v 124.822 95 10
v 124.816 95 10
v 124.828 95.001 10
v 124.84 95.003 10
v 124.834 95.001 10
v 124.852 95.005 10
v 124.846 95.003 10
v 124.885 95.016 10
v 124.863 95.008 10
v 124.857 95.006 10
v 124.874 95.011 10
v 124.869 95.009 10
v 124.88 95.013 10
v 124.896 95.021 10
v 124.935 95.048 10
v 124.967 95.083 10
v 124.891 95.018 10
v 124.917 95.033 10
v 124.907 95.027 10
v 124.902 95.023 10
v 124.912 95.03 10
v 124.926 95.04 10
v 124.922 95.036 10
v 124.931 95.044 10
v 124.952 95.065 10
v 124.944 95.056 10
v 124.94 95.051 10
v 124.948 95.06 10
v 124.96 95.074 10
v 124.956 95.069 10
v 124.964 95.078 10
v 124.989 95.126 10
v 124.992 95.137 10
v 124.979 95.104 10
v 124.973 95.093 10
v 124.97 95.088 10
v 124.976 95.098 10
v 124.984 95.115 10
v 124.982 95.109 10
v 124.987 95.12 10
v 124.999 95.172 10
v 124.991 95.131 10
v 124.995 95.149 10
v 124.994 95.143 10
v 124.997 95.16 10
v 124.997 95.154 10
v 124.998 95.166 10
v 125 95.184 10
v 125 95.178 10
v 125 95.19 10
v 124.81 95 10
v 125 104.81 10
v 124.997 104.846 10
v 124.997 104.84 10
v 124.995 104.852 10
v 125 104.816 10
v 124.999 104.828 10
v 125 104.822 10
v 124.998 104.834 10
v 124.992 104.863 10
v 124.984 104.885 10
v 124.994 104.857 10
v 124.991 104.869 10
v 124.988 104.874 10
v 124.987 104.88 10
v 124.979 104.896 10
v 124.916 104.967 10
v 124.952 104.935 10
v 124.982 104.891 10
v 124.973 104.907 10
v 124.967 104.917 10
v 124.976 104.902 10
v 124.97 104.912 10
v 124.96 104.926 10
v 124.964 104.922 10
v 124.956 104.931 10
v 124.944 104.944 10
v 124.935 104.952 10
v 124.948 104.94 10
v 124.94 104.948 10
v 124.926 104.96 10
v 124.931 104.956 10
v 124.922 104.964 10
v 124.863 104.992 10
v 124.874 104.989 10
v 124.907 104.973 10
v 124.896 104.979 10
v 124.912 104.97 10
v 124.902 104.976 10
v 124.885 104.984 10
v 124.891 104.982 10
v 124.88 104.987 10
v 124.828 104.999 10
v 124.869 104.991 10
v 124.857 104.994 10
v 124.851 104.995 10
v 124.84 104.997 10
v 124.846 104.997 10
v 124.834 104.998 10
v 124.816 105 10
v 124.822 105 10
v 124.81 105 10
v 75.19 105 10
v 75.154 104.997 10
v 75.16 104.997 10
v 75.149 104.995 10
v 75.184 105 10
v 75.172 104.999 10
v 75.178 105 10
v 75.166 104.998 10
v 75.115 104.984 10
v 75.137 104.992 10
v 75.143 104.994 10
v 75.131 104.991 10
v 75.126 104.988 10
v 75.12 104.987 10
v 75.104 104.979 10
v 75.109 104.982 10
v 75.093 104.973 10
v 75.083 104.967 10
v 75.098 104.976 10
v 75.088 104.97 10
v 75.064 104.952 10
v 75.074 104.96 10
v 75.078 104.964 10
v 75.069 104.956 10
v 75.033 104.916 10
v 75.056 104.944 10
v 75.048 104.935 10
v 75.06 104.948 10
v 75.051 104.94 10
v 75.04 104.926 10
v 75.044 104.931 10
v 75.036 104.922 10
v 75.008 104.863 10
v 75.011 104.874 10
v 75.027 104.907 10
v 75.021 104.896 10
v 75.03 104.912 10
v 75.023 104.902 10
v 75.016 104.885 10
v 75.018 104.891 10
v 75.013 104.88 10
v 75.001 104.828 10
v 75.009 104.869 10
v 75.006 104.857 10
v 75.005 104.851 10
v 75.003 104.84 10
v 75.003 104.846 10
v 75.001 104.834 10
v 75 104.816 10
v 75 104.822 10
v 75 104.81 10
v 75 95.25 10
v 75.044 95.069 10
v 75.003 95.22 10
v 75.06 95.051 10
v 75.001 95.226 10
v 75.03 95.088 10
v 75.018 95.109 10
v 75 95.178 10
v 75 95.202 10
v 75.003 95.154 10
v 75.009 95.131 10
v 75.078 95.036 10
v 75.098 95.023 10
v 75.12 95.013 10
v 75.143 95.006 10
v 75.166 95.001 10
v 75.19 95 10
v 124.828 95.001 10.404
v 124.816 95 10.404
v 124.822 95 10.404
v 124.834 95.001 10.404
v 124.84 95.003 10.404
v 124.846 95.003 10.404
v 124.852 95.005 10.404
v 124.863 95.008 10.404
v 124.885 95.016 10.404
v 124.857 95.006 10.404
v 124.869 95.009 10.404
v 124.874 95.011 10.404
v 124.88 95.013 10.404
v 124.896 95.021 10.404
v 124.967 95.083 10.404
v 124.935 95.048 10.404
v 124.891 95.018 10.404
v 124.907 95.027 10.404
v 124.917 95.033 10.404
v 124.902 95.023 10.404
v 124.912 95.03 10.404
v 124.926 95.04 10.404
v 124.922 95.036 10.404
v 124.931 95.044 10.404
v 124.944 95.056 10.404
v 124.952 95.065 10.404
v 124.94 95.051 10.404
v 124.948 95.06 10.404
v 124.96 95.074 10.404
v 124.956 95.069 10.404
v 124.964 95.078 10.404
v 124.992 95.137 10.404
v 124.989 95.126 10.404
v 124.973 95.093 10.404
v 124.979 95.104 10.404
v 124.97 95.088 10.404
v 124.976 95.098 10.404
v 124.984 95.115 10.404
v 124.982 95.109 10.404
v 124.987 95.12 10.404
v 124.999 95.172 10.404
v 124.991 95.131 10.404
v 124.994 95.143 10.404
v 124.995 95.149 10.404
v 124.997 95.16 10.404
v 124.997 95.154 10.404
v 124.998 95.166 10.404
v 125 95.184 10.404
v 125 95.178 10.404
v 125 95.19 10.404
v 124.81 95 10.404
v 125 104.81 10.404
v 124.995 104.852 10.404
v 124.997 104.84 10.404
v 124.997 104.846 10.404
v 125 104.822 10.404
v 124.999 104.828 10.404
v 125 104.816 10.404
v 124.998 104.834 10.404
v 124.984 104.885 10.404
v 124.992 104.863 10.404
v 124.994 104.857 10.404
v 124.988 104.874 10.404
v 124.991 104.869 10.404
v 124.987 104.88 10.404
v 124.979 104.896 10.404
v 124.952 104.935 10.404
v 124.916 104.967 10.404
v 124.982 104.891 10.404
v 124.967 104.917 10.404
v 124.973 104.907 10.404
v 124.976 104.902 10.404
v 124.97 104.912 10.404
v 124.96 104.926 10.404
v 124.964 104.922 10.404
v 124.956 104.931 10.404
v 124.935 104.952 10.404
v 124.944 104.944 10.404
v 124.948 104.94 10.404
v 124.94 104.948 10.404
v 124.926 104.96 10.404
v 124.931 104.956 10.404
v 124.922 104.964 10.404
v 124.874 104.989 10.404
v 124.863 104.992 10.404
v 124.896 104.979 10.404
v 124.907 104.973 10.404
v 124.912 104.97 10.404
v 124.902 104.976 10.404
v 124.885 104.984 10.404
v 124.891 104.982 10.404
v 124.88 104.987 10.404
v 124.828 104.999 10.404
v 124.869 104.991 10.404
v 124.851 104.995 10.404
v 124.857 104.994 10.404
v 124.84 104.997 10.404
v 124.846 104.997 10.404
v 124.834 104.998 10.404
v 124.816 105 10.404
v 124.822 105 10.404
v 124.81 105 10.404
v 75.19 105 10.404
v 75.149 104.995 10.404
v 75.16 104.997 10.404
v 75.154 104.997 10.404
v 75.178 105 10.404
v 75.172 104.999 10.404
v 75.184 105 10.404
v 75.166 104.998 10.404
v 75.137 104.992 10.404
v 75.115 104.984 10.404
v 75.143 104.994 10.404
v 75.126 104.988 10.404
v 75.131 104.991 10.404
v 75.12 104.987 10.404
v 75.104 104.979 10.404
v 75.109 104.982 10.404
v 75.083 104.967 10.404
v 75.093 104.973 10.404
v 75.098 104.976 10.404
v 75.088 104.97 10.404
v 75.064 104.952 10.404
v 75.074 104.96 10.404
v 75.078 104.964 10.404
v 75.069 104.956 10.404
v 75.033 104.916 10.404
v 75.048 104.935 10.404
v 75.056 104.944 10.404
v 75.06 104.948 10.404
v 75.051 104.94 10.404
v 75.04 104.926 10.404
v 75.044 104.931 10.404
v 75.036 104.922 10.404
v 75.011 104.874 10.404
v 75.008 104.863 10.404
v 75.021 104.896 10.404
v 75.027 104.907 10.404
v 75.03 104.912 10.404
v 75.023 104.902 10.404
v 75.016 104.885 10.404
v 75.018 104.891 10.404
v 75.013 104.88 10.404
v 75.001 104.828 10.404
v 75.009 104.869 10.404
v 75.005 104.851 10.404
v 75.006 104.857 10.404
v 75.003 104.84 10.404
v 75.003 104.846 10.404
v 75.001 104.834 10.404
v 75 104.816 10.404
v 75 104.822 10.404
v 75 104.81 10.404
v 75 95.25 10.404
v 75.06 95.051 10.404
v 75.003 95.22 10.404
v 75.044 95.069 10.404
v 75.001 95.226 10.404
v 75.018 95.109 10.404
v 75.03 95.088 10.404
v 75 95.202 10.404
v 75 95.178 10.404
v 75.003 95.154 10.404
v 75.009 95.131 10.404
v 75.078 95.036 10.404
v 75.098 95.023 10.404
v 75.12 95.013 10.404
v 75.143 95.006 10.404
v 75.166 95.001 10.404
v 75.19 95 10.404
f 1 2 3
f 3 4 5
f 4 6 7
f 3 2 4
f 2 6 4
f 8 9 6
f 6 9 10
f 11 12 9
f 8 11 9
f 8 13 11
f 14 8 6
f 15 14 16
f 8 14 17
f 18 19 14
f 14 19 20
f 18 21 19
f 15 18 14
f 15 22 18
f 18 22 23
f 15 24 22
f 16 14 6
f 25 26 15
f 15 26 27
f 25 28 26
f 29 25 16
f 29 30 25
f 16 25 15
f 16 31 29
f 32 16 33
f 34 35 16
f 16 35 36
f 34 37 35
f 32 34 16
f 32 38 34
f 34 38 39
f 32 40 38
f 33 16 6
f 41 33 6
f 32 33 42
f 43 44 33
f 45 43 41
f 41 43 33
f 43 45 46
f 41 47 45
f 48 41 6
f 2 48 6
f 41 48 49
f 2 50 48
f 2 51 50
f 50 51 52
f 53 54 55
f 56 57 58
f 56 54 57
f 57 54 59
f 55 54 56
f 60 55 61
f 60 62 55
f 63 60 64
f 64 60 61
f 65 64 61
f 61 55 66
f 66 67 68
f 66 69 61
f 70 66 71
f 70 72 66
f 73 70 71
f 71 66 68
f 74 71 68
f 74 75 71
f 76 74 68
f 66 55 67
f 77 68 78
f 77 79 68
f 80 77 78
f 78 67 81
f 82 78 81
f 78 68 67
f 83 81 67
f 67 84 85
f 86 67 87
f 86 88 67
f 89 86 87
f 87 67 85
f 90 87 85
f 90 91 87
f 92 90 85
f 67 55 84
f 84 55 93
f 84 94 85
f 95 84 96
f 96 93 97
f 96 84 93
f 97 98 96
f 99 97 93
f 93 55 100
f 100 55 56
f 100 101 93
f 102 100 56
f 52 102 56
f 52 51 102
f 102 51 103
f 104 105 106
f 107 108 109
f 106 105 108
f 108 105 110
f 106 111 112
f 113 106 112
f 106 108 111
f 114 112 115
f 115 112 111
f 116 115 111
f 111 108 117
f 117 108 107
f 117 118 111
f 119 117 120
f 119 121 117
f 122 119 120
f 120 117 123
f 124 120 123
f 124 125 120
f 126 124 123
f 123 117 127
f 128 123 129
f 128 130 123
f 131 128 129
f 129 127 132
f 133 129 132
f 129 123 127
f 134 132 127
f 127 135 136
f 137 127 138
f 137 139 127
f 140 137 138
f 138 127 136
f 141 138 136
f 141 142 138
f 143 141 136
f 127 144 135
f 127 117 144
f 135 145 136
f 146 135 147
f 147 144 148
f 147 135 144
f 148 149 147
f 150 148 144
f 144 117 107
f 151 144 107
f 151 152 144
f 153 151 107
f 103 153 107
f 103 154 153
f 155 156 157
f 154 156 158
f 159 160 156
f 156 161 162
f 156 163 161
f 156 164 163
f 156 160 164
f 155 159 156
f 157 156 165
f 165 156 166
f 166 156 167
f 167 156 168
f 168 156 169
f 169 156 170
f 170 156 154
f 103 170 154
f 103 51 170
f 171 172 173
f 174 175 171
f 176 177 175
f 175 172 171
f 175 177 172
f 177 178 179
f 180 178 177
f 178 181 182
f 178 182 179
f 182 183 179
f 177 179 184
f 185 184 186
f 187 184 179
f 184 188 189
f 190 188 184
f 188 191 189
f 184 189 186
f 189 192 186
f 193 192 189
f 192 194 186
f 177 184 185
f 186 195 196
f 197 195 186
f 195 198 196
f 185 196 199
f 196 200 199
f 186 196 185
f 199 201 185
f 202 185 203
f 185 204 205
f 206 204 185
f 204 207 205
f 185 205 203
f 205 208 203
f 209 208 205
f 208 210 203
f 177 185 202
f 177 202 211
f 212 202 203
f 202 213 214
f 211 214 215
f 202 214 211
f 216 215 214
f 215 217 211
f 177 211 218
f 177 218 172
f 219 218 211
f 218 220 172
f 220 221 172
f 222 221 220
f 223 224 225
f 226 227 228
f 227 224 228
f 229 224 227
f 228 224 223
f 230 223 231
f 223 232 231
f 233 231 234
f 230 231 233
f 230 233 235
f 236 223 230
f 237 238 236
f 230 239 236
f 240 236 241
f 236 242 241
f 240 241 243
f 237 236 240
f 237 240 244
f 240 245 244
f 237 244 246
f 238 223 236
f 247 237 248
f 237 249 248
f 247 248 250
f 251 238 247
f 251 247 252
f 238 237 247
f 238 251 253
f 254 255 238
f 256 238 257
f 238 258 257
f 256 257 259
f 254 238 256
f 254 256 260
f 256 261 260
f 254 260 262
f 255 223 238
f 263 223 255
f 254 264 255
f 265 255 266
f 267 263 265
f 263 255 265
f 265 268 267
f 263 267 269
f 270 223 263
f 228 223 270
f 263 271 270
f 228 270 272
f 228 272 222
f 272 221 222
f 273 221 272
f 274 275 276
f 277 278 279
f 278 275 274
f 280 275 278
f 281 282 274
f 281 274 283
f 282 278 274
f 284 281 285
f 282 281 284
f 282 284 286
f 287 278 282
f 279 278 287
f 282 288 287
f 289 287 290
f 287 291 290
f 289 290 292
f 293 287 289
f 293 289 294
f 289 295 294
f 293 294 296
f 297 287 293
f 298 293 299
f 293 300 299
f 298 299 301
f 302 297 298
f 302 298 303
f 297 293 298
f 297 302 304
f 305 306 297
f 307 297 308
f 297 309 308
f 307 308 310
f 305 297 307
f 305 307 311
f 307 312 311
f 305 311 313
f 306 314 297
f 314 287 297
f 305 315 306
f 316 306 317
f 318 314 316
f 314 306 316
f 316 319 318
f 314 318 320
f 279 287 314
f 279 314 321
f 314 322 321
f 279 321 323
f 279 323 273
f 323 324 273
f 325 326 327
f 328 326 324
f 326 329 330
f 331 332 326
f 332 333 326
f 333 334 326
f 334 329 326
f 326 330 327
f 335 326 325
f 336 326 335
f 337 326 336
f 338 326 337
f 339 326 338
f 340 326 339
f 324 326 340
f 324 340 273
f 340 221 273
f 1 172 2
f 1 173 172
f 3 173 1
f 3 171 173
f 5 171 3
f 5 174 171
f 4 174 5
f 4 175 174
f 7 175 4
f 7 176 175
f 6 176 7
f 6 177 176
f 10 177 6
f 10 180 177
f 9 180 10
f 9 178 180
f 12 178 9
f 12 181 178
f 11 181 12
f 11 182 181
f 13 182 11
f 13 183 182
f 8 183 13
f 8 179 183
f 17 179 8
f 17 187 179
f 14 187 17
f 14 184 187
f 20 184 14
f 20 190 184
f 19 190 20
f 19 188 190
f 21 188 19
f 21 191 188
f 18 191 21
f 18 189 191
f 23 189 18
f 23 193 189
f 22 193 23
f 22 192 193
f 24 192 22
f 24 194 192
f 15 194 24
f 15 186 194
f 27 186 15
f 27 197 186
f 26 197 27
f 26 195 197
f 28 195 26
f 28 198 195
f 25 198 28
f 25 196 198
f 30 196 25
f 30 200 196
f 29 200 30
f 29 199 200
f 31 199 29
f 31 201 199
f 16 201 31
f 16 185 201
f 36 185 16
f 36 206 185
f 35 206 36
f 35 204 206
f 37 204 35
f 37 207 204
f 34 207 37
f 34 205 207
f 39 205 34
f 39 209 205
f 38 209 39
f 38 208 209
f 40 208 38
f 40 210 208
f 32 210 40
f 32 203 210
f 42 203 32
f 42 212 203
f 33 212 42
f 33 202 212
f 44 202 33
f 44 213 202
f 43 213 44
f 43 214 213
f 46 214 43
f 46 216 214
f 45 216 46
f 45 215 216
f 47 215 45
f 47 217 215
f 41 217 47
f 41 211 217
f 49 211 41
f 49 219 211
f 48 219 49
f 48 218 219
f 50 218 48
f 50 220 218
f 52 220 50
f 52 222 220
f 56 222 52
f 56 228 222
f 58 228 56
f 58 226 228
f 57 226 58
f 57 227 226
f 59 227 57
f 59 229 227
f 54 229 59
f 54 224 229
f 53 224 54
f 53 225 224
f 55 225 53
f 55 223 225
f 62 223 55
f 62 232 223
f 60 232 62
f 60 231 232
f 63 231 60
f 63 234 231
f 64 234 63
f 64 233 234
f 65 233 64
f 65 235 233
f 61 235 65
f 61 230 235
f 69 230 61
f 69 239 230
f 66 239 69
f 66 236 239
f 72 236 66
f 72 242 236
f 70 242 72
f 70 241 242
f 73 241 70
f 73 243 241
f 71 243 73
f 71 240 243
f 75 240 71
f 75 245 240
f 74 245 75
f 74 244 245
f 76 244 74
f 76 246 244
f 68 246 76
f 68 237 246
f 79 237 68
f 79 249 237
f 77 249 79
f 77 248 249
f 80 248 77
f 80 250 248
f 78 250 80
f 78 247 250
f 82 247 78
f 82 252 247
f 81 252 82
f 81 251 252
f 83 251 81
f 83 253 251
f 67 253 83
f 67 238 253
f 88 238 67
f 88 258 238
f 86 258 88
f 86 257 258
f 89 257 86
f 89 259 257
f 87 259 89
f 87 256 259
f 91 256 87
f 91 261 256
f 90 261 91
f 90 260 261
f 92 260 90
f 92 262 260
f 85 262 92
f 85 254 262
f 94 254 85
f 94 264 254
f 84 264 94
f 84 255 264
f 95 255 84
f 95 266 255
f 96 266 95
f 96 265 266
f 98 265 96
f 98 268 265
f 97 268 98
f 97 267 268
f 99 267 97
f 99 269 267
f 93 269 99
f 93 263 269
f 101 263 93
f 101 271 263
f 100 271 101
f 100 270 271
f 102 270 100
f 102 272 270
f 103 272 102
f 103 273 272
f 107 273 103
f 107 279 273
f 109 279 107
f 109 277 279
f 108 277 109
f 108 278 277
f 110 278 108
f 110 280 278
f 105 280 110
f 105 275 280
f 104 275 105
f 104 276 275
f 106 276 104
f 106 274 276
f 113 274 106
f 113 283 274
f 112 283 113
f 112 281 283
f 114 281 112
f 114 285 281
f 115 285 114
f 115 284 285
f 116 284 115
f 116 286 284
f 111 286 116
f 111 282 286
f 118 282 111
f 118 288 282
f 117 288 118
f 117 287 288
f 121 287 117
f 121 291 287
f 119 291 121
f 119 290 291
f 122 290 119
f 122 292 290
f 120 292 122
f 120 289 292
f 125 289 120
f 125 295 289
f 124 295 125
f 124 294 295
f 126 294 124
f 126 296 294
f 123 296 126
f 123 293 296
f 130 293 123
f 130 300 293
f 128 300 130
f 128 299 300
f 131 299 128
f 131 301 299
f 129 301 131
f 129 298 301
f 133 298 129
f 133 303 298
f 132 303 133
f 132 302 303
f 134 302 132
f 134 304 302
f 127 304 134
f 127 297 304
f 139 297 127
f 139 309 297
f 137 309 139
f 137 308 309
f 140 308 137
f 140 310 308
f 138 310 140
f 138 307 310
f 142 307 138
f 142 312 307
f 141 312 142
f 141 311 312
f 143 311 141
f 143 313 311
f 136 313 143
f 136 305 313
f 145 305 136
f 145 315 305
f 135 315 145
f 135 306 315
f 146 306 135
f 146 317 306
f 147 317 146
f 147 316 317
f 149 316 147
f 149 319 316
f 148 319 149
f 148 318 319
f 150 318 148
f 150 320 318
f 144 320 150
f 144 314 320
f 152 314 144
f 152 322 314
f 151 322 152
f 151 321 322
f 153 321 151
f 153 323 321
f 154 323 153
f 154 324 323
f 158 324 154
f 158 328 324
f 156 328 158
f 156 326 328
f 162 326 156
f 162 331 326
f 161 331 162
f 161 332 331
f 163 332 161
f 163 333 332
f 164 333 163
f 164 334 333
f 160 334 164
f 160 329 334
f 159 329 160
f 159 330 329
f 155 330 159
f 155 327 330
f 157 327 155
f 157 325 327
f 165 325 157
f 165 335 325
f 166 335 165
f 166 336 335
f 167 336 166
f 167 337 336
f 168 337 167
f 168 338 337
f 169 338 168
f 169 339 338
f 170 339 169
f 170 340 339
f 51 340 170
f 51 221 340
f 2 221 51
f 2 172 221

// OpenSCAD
module drawBasicShape(x1, y1, x2, y2, width)
{
	length = sqrt((x1-x2)*(x1-x2) + (y1-y2)*(y1-y2));
	if (width!=0.0) {
		square(size = [width, length], center = false);
		translate([width/2.0, 0, 0]) circle(d=width);
		translate([width/2.0, length, 0]) circle(d=width);
	}
}

module translateAndRotate(x1, y1, x2, y2, width)
{
	if (width != 0.0) {
		angle = atan((y2-y1)/(x2-x1)) +270;
		if (x2>=x1) {
			translate([x1, y1, 0.0]) rotate([0.0, 0.0, angle]) translate([-width/2.0, 0.0, 0.0]) scale([1.0, 1.0, 1.0]) drawBasicShape(x1, y1, x2, y2, width);
		}
		else {
			translate([x1, y1, 0.0]) rotate([0.0, 0.0, angle+180]) translate([-width/2.0, 0.0, 0.0]) scale([1.0, 1.0, 1.0]) drawBasicShape(x1, y1, x2, y2, width);		}
	}
}

$fn=50;

points24 = [
[75.77800000, 95.77800000, 0.00000000],
[124.22200000, 95.77800000, 0.37999672],
[124.22200000, 104.22200000, 0.37997788],
[75.77800000, 104.22200000, 0.37999548],
[75.77800000, 95.83800000, 0.37998140],
[75.48400000, 95.48400000, 0.00000000],
[124.51600000, 95.48400000, 0.37999746],
[124.51600000, 104.51600000, 0.37998977],
[75.48400000, 104.51600000, 0.37999746],
[75.48400000, 95.54400000, 0.37999314],
[75.19000000, 95.19000000, 0.00000000],
[124.81000000, 95.19000000, 0.37999939],
[124.81000000, 104.81000000, 0.38000021],
[75.19000000, 104.81000000, 0.38000060],
[75.19000000, 95.25000000, 0.37999715],
[75.53600000, 95.39000000, 0.00000000],
[75.94600000, 103.88900000, 0.00000000],
[76.11100000, 104.05400000, 0.37961375],
[76.52800000, 104.05400000, 0.38001190],
[75.94600000, 103.47200000, 0.37989934],
[75.94600000, 103.05500000, 0.38015610],
[76.94500000, 104.05400000, 0.37994651],
[77.36200000, 104.05400000, 0.38001190],
[75.94600000, 102.63800000, 0.37999592],
[75.94600000, 102.22100000, 0.38001190],
[77.77900000, 104.05400000, 0.37999966],
[78.19600000, 104.05400000, 0.38015610],
[75.94600000, 101.80400000, 0.38000201],
[75.94600000, 101.38700000, 0.38001190],
[78.61300000, 104.05400000, 0.38001957],
[79.03000000, 104.05400000, 0.38001190],
[75.94600000, 100.97000000, 0.38001859],
[75.94600000, 100.55300000, 0.38015610],
[79.44700000, 104.05400000, 0.38001785],
[79.86400000, 104.05400000, 0.38001190],
[75.94600000, 100.13600000, 0.38002811],
[75.94600000, 99.71900000, 0.38001190],
[80.28100000, 104.05400000, 0.38002660],
[80.69800000, 104.05400000, 0.38001190],
[75.94600000, 99.30200000, 0.38003429],
[75.94600000, 98.88500000, 0.38001190],
[81.11500000, 104.05400000, 0.38003252],
[81.53300000, 104.05400000, 0.37930814],
[75.94600000, 98.46700000, 0.37997836],
[75.94600000, 98.05000000, 0.38001190],
[81.95000000, 104.05400000, 0.37998780],
[82.36700000, 104.05400000, 0.38001190],
[75.94600000, 97.63300000, 0.37998939],
[75.94600000, 97.21600000, 0.38001190],
[82.78400000, 104.05400000, 0.37999079],
[83.20100000, 104.05400000, 0.38001190],
[75.94600000, 96.79900000, 0.37999203],
[75.94600000, 96.38200000, 0.38015610],
[83.61800000, 104.05400000, 0.37999314],
[84.03500000, 104.05400000, 0.38001190],
[75.95600000, 95.97600000, 0.38000275],
[76.34400000, 95.94600000, 0.37958004],
[84.45200000, 104.05400000, 0.38000754],
[84.86900000, 104.05400000, 0.38001190],
[76.76100000, 95.94600000, 0.38000229],
[77.17800000, 95.94600000, 0.38015610],
[85.28600000, 104.05400000, 0.38000229],
[85.70300000, 104.05400000, 0.38001190],
[77.59500000, 95.94600000, 0.38000754],
[78.01200000, 95.94600000, 0.38001190],
[86.12000000, 104.05400000, 0.38000229],
[86.53700000, 104.05400000, 0.38001190],
[78.42900000, 95.94600000, 0.38000754],
[78.84600000, 95.94600000, 0.38001190],
[86.95400000, 104.05400000, 0.38000229],
[87.37100000, 104.05400000, 0.38015610],
[79.26300000, 95.94600000, 0.38000229],
[79.68000000, 95.94600000, 0.38001190],
[87.78900000, 104.05400000, 0.37998940],
[88.20600000, 104.05400000, 0.38001190],
[80.09700000, 95.94600000, 0.37998415],
[80.51500000, 95.94600000, 0.37930814],
[88.62300000, 104.05400000, 0.38000754],
[89.04000000, 104.05400000, 0.38001190],
[80.93200000, 95.94600000, 0.38000229],
[81.34900000, 95.94600000, 0.38015610],
[89.45700000, 104.05400000, 0.38000229],
[89.87400000, 104.05400000, 0.38001190],
[81.76600000, 95.94600000, 0.38000229],
[82.18300000, 95.94600000, 0.38015610],
[90.29100000, 104.05400000, 0.38000229],
[90.70800000, 104.05400000, 0.38001190],
[82.60000000, 95.94600000, 0.38000754],
[83.01700000, 95.94600000, 0.38001190],
[91.12500000, 104.05400000, 0.38000229],
[91.54200000, 104.05400000, 0.38015610],
[83.43400000, 95.94600000, 0.38000229],
[83.85100000, 95.94600000, 0.38001190],
[91.95900000, 104.05400000, 0.38000229],
[92.37600000, 104.05400000, 0.38015610],
[84.26800000, 95.94600000, 0.38000229],
[84.68500000, 95.94600000, 0.38001190],
[92.79300000, 104.05400000, 0.38000754],
[93.21000000, 104.05400000, 0.38001190],
[85.10200000, 95.94600000, 0.38000229],
[85.51900000, 95.94600000, 0.38001190],
[93.62700000, 104.05400000, 0.38000754],
[94.04400000, 104.05400000, 0.38001190],
[85.93600000, 95.94600000, 0.38000229],
[86.35300000, 95.94600000, 0.38015610],
[94.46200000, 104.05400000, 0.37998415],
[94.87900000, 104.05400000, 0.38001190],
[86.77000000, 95.94600000, 0.37998940],
[87.18800000, 95.94600000, 0.37930814],
[95.29600000, 104.05400000, 0.38000229],
[95.71300000, 104.05400000, 0.38001190],
[87.60500000, 95.94600000, 0.38000754],
[88.02200000, 95.94600000, 0.38001190],
[96.13000000, 104.05400000, 0.38000229],
[96.54700000, 104.05400000, 0.38015610],
[88.43900000, 95.94600000, 0.38000229],
[88.85600000, 95.94600000, 0.38001190],
[96.96400000, 104.05400000, 0.38000754],
[97.38100000, 104.05400000, 0.38001190],
[89.27300000, 95.94600000, 0.38000229],
[89.69000000, 95.94600000, 0.38001190],
[97.79800000, 104.05400000, 0.38000754],
[98.21500000, 104.05400000, 0.38001190],
[90.10700000, 95.94600000, 0.38000229],
[90.52400000, 95.94600000, 0.38015610],
[98.63200000, 104.05400000, 0.38000229],
[99.04900000, 104.05400000, 0.38001190],
[90.94100000, 95.94600000, 0.38000754],
[91.35800000, 95.94600000, 0.38001190],
[99.46600000, 104.05400000, 0.38000229],
[99.88300000, 104.05400000, 0.38001190],
[91.77500000, 95.94600000, 0.38000754],
[92.19200000, 95.94600000, 0.38001190],
[100.30000000, 104.05400000, 0.38000229],
[100.71800000, 104.05400000, 0.37945200],
[92.60900000, 95.94600000, 0.37998415],
[93.02600000, 95.94600000, 0.38001190],
[101.13500000, 104.05400000, 0.37998940],
[101.55200000, 104.05400000, 0.38001190],
[93.44400000, 95.94600000, 0.38000229],
[93.86100000, 95.94600000, 0.38001190],
[101.96900000, 104.05400000, 0.38000754],
[102.38600000, 104.05400000, 0.38001190],
[94.27800000, 95.94600000, 0.38000229],
[94.69500000, 95.94600000, 0.38015610],
[102.80300000, 104.05400000, 0.38000229],
[103.22000000, 104.05400000, 0.38001190],
[95.11200000, 95.94600000, 0.38000754],
[95.52900000, 95.94600000, 0.38001190],
[103.63700000, 104.05400000, 0.38000229],
[104.05400000, 104.05400000, 0.38001190],
[95.94600000, 95.94600000, 0.38000754],
[96.36300000, 95.94600000, 0.38001190],
[104.47100000, 104.05400000, 0.38000229],
[104.88800000, 104.05400000, 0.38015610],
[96.78000000, 95.94600000, 0.38000229],
[97.19700000, 95.94600000, 0.38001190],
[105.30500000, 104.05400000, 0.38000229],
[105.72200000, 104.05400000, 0.38015610],
[97.61400000, 95.94600000, 0.38000229],
[98.03100000, 95.94600000, 0.38001190],
[106.13900000, 104.05400000, 0.38000754],
[106.55600000, 104.05400000, 0.38001190],
[98.44800000, 95.94600000, 0.38000229],
[98.86500000, 95.94600000, 0.38015610],
[106.97300000, 104.05400000, 0.38000229],
[107.39100000, 104.05400000, 0.37930814],
[99.28200000, 95.94600000, 0.37998415],
[99.69900000, 95.94600000, 0.38015610],
[107.80800000, 104.05400000, 0.37998415],
[108.22500000, 104.05400000, 0.38001190],
[100.11700000, 95.94600000, 0.38000754],
[100.53400000, 95.94600000, 0.38001190],
[108.64200000, 104.05400000, 0.38000229],
[109.05900000, 104.05400000, 0.38001190],
[100.95100000, 95.94600000, 0.38000754],
[101.36800000, 95.94600000, 0.38001190],
[109.47600000, 104.05400000, 0.38000229],
[109.89300000, 104.05400000, 0.38015610],
[101.78500000, 95.94600000, 0.38000229],
[102.20200000, 95.94600000, 0.38001190],
[110.31000000, 104.05400000, 0.38000754],
[110.72700000, 104.05400000, 0.38001190],
[102.61900000, 95.94600000, 0.38000229],
[103.03600000, 95.94600000, 0.38001190],
[111.14400000, 104.05400000, 0.38000754],
[111.56100000, 104.05400000, 0.38001190],
[103.45300000, 95.94600000, 0.38000229],
[103.87000000, 95.94600000, 0.38015610],
[111.97800000, 104.05400000, 0.38000229],
[112.39500000, 104.05400000, 0.38001190],
[104.28700000, 95.94600000, 0.38000754],
[104.70400000, 95.94600000, 0.38001190],
[112.81200000, 104.05400000, 0.38000229],
[113.22900000, 104.05400000, 0.38001190],
[105.12100000, 95.94600000, 0.38000754],
[105.53800000, 95.94600000, 0.38001190],
[113.64700000, 104.05400000, 0.37998415],
[114.06400000, 104.05400000, 0.38015610],
[105.95500000, 95.94600000, 0.37998415],
[106.37300000, 95.94600000, 0.37930814],
[114.48100000, 104.05400000, 0.38000754],
[114.89800000, 104.05400000, 0.38001190],
[106.79000000, 95.94600000, 0.38000229],
[107.20700000, 95.94600000, 0.38001190],
[115.31500000, 104.05400000, 0.38000754],
[115.73200000, 104.05400000, 0.38001190],
[107.62400000, 95.94600000, 0.38000229],
[108.04100000, 95.94600000, 0.38015610],
[116.14900000, 104.05400000, 0.38000229],
[116.56600000, 104.05400000, 0.38001190],
[108.45800000, 95.94600000, 0.38000754],
[108.87500000, 95.94600000, 0.38001190],
[116.98300000, 104.05400000, 0.38000229],
[117.40000000, 104.05400000, 0.38001190],
[109.29200000, 95.94600000, 0.38000754],
[109.70900000, 95.94600000, 0.38001190],
[117.81700000, 104.05400000, 0.38000229],
[118.23400000, 104.05400000, 0.38015610],
[110.12600000, 95.94600000, 0.38000229],
[110.54300000, 95.94600000, 0.38001190],
[118.65100000, 104.05400000, 0.38000229],
[119.06800000, 104.05400000, 0.38015610],
[110.96000000, 95.94600000, 0.38000229],
[111.37700000, 95.94600000, 0.38001190],
[119.48500000, 104.05400000, 0.38000754],
[119.90200000, 104.05400000, 0.38001190],
[111.79400000, 95.94600000, 0.38000229],
[112.21100000, 95.94600000, 0.38001190],
[120.32000000, 104.05400000, 0.37998940],
[120.73700000, 104.05400000, 0.38001190],
[112.62900000, 95.94600000, 0.38000229],
[113.04600000, 95.94600000, 0.38015610],
[121.15400000, 104.05400000, 0.38000229],
[121.57100000, 104.05400000, 0.38001190],
[113.46300000, 95.94600000, 0.38000754],
[113.88000000, 95.94600000, 0.38001190],
[121.98800000, 104.05400000, 0.38000229],
[122.40500000, 104.05400000, 0.38001190],
[114.29700000, 95.94600000, 0.38000754],
[114.71400000, 95.94600000, 0.38001190],
[122.82200000, 104.05400000, 0.38000229],
[123.23900000, 104.05400000, 0.38015610],
[115.13100000, 95.94600000, 0.38000229],
[115.54800000, 95.94600000, 0.38001190],
[123.65600000, 104.05400000, 0.38000754],
[124.04400000, 104.02500000, 0.37963728],
[115.96500000, 95.94600000, 0.37998455],
[116.38200000, 95.94600000, 0.38001190],
[124.05400000, 103.61800000, 0.37999868],
[124.05400000, 103.20100000, 0.38001190],
[116.79900000, 95.94600000, 0.37999789],
[117.21600000, 95.94600000, 0.38001190],
[124.05400000, 102.78400000, 0.37999701],
[124.05400000, 102.36700000, 0.38001190],
[117.63300000, 95.94600000, 0.37998939],
[118.05000000, 95.94600000, 0.38001190],
[124.05400000, 101.95000000, 0.37998780],
[124.05400000, 101.53300000, 0.38001190],
[118.46700000, 95.94600000, 0.37997836],
[118.88400000, 95.94600000, 0.38015610],
[124.05400000, 101.11600000, 0.37997562],
[124.05400000, 100.69800000, 0.37930814],
[119.30200000, 95.94600000, 0.38003429],
[119.71900000, 95.94600000, 0.38001190],
[124.05400000, 100.28100000, 0.38002660],
[124.05400000, 99.86400000, 0.38001190],
[120.13600000, 95.94600000, 0.38003896],
[120.55300000, 95.94600000, 0.38001190],
[124.05400000, 99.44700000, 0.38002999],
[124.05400000, 99.03000000, 0.38001190],
[120.97000000, 95.94600000, 0.38001859],
[121.38700000, 95.94600000, 0.38001190],
[124.05400000, 98.61300000, 0.38001957],
[124.05400000, 98.19600000, 0.38015610],
[121.80400000, 95.94600000, 0.38000201],
[122.22100000, 95.94600000, 0.38015610],
[124.05400000, 97.77900000, 0.37999966],
[124.05400000, 97.36200000, 0.38001190],
[122.63800000, 95.94600000, 0.38002595],
[123.05500000, 95.94600000, 0.38001190],
[124.05400000, 96.94500000, 0.37998907],
[124.05400000, 96.52800000, 0.38001190],
[123.47200000, 95.94600000, 0.37989934],
[123.88900000, 95.94600000, 0.38001190],
[124.05400000, 96.11100000, 0.37987144],
];

translate([0.0, 0.0, 10.00000000]) {
	linear_extrude(height = 0.40400000, center = false, convexity = 10, twist = 0) {
		union() {
			for( i=[0:len(points24)-2] ){ 
				x1 = points24[i][0];
				y1 = points24[i][1];
				x2 = points24[i+1][0];
				y2 = points24[i+1][1];
				width = points24[i+1][2];
				translateAndRotate(x1, y1, x2, y2, width);
			}
		}
	}
}
